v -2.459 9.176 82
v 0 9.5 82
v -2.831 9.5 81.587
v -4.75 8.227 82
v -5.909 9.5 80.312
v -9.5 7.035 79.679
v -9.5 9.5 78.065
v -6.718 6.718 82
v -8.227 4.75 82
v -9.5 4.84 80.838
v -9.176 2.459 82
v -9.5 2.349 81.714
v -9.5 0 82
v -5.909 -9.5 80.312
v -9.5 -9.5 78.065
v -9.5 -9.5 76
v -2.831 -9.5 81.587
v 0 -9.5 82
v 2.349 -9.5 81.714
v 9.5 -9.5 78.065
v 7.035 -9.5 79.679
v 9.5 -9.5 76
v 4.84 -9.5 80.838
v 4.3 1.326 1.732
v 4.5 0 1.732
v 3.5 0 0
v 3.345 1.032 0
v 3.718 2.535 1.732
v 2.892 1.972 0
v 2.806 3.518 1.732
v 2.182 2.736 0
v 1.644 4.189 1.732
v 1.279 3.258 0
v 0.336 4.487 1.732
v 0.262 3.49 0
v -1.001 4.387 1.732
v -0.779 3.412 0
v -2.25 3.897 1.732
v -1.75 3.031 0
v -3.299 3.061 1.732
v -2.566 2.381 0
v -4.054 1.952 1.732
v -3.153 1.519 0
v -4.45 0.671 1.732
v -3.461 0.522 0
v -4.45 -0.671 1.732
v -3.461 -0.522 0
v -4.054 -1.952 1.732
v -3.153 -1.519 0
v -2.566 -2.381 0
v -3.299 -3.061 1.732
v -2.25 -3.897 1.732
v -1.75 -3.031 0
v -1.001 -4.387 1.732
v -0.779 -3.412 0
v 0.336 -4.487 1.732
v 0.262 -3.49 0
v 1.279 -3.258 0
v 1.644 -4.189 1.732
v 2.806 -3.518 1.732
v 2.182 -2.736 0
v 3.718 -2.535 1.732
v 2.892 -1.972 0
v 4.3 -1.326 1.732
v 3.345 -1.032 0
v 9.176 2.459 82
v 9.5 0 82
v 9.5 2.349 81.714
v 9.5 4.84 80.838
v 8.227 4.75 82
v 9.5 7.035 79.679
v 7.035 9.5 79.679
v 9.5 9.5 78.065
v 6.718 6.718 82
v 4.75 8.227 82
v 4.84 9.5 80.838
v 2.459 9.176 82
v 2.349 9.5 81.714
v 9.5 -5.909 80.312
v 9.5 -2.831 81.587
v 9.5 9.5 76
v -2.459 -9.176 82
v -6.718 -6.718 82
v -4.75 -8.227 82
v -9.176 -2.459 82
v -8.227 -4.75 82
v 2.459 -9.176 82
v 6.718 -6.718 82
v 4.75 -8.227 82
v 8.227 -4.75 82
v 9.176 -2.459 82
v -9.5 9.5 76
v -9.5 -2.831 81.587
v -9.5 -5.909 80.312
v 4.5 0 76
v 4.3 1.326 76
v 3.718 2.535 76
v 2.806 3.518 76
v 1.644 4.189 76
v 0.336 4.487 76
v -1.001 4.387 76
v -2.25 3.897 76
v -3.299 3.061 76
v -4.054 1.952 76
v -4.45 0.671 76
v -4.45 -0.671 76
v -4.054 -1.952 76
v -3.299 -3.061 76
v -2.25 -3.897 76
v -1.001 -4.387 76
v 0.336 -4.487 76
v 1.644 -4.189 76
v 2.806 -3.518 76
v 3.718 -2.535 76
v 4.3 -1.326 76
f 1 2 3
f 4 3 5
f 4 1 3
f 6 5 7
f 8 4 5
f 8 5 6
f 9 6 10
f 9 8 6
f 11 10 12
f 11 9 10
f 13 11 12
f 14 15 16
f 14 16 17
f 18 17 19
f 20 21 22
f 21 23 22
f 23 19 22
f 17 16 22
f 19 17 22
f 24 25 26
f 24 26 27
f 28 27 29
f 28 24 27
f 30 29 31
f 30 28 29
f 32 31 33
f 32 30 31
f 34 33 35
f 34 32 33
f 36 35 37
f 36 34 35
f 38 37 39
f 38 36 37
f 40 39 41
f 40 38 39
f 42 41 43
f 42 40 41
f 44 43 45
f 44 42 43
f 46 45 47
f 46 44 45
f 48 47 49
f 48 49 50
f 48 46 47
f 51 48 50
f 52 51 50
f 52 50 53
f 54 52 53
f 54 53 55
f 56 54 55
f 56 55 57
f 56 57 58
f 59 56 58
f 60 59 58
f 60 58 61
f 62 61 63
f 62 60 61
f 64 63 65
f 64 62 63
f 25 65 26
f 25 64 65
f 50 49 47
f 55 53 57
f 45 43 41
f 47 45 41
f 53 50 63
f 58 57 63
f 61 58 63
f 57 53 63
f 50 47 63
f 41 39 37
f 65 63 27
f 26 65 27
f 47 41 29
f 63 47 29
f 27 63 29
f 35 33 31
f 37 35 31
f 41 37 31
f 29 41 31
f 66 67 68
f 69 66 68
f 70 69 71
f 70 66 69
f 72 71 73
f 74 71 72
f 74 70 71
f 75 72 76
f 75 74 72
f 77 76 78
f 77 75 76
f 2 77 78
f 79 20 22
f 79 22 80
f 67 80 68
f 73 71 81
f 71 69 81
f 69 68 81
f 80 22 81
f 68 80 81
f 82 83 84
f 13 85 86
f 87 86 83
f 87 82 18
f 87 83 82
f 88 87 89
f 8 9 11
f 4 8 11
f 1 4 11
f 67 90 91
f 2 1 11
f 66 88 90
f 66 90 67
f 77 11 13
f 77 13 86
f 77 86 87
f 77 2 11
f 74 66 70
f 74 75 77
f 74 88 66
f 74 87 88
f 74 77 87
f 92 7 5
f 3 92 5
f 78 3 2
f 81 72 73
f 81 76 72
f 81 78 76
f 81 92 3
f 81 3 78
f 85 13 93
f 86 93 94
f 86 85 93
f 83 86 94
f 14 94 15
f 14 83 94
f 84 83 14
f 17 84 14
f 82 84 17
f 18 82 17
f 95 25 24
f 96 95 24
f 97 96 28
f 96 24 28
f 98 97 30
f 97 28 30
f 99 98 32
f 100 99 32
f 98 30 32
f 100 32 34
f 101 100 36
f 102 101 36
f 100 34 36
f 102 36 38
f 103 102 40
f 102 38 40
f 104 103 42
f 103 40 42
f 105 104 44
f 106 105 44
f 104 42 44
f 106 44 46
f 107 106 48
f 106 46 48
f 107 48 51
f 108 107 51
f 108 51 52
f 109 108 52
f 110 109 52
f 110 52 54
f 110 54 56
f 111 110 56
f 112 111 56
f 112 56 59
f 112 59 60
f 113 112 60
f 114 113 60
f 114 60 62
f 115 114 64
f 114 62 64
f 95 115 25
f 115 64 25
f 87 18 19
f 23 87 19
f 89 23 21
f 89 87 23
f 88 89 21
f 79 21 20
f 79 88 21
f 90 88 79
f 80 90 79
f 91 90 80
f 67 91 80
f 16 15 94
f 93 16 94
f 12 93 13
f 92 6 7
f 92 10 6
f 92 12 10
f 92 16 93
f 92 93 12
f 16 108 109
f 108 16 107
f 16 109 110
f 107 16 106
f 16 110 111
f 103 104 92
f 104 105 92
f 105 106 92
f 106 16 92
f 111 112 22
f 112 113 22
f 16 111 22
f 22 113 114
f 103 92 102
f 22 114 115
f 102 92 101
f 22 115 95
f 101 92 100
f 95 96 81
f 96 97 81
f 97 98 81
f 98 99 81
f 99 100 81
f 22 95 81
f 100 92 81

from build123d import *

# Parameters (mm, degrees)
SKETCH2_R           = 4.5
BOSS_EXTRUDE1_DEPTH = 76
SKETCH3_W           = 19
SKETCH3_H           = 19
BOSS_EXTRUDE2_DEPTH = 6
CHAMFER1_SIZE       = 1
CHAMFER1_SIZE2      = 1.732050808
SKETCH4_OUTSIDE_W   = 50.258
SKETCH4_OUTSIDE_H   = 50.258
SKETCH4_OUTSIDE_R   = 9.5
CUT_EXTRUDE1_DEPTH  = 6
CUT_EXTRUDE1_DRAFT  = -45


with BuildPart() as part:
    # Sketch2 → Boss-Extrude1 (new body)
    with BuildSketch(Plane.XY):
        Circle(SKETCH2_R)
    extrude(amount=BOSS_EXTRUDE1_DEPTH)

    # Sketch3 → Boss-Extrude2 (add)
    with BuildSketch(Plane.XY.offset(76)):
        Rectangle(SKETCH3_W, SKETCH3_H)
    extrude(amount=BOSS_EXTRUDE2_DEPTH)

    # Chamfer1
    chamfer1_edges = [part.edges().sort_by_distance(p)[0] for p in [
        (-4.5, 0, 0),
    ]]
    chamfer1_side = [part.faces().sort_by_distance(p)[0] for p in [
        (0, 0, 0),
    ]]
    chamfer(chamfer1_edges, length=CHAMFER1_SIZE, length2=CHAMFER1_SIZE2, reference=chamfer1_side[0])


with BuildPart() as cut_extrude1_tool:
    # Sketch4 outside → Cut-Extrude1 (with draft: the straight prism first)
    with BuildSketch(Plane.XY.offset(82)):
        Rectangle(SKETCH4_OUTSIDE_W, SKETCH4_OUTSIDE_H)
        Circle(SKETCH4_OUTSIDE_R, mode=Mode.SUBTRACT)
    extrude(amount=-CUT_EXTRUDE1_DEPTH)
    # Cut-Extrude1: the draft: its side faces are tilted about the plane it starts from
    cut_extrude1_sides = [cut_extrude1_tool.faces().sort_by_distance(p)[0] for p in [
        (0, -25.129, 79),
        (25.129, 0, 79),
        (0, 25.129, 79),
        (-25.129, 0, 79),
        (-9.5, 0, 79),
    ]]
    draft(cut_extrude1_sides, Plane.XY.offset(82), CUT_EXTRUDE1_DRAFT)


with BuildPart() as part_1:
    add(part.part)

    # Cut-Extrude1: cut by cut_extrude1_tool
    add(cut_extrude1_tool.part, mode=Mode.SUBTRACT)


solid = part_1.part
